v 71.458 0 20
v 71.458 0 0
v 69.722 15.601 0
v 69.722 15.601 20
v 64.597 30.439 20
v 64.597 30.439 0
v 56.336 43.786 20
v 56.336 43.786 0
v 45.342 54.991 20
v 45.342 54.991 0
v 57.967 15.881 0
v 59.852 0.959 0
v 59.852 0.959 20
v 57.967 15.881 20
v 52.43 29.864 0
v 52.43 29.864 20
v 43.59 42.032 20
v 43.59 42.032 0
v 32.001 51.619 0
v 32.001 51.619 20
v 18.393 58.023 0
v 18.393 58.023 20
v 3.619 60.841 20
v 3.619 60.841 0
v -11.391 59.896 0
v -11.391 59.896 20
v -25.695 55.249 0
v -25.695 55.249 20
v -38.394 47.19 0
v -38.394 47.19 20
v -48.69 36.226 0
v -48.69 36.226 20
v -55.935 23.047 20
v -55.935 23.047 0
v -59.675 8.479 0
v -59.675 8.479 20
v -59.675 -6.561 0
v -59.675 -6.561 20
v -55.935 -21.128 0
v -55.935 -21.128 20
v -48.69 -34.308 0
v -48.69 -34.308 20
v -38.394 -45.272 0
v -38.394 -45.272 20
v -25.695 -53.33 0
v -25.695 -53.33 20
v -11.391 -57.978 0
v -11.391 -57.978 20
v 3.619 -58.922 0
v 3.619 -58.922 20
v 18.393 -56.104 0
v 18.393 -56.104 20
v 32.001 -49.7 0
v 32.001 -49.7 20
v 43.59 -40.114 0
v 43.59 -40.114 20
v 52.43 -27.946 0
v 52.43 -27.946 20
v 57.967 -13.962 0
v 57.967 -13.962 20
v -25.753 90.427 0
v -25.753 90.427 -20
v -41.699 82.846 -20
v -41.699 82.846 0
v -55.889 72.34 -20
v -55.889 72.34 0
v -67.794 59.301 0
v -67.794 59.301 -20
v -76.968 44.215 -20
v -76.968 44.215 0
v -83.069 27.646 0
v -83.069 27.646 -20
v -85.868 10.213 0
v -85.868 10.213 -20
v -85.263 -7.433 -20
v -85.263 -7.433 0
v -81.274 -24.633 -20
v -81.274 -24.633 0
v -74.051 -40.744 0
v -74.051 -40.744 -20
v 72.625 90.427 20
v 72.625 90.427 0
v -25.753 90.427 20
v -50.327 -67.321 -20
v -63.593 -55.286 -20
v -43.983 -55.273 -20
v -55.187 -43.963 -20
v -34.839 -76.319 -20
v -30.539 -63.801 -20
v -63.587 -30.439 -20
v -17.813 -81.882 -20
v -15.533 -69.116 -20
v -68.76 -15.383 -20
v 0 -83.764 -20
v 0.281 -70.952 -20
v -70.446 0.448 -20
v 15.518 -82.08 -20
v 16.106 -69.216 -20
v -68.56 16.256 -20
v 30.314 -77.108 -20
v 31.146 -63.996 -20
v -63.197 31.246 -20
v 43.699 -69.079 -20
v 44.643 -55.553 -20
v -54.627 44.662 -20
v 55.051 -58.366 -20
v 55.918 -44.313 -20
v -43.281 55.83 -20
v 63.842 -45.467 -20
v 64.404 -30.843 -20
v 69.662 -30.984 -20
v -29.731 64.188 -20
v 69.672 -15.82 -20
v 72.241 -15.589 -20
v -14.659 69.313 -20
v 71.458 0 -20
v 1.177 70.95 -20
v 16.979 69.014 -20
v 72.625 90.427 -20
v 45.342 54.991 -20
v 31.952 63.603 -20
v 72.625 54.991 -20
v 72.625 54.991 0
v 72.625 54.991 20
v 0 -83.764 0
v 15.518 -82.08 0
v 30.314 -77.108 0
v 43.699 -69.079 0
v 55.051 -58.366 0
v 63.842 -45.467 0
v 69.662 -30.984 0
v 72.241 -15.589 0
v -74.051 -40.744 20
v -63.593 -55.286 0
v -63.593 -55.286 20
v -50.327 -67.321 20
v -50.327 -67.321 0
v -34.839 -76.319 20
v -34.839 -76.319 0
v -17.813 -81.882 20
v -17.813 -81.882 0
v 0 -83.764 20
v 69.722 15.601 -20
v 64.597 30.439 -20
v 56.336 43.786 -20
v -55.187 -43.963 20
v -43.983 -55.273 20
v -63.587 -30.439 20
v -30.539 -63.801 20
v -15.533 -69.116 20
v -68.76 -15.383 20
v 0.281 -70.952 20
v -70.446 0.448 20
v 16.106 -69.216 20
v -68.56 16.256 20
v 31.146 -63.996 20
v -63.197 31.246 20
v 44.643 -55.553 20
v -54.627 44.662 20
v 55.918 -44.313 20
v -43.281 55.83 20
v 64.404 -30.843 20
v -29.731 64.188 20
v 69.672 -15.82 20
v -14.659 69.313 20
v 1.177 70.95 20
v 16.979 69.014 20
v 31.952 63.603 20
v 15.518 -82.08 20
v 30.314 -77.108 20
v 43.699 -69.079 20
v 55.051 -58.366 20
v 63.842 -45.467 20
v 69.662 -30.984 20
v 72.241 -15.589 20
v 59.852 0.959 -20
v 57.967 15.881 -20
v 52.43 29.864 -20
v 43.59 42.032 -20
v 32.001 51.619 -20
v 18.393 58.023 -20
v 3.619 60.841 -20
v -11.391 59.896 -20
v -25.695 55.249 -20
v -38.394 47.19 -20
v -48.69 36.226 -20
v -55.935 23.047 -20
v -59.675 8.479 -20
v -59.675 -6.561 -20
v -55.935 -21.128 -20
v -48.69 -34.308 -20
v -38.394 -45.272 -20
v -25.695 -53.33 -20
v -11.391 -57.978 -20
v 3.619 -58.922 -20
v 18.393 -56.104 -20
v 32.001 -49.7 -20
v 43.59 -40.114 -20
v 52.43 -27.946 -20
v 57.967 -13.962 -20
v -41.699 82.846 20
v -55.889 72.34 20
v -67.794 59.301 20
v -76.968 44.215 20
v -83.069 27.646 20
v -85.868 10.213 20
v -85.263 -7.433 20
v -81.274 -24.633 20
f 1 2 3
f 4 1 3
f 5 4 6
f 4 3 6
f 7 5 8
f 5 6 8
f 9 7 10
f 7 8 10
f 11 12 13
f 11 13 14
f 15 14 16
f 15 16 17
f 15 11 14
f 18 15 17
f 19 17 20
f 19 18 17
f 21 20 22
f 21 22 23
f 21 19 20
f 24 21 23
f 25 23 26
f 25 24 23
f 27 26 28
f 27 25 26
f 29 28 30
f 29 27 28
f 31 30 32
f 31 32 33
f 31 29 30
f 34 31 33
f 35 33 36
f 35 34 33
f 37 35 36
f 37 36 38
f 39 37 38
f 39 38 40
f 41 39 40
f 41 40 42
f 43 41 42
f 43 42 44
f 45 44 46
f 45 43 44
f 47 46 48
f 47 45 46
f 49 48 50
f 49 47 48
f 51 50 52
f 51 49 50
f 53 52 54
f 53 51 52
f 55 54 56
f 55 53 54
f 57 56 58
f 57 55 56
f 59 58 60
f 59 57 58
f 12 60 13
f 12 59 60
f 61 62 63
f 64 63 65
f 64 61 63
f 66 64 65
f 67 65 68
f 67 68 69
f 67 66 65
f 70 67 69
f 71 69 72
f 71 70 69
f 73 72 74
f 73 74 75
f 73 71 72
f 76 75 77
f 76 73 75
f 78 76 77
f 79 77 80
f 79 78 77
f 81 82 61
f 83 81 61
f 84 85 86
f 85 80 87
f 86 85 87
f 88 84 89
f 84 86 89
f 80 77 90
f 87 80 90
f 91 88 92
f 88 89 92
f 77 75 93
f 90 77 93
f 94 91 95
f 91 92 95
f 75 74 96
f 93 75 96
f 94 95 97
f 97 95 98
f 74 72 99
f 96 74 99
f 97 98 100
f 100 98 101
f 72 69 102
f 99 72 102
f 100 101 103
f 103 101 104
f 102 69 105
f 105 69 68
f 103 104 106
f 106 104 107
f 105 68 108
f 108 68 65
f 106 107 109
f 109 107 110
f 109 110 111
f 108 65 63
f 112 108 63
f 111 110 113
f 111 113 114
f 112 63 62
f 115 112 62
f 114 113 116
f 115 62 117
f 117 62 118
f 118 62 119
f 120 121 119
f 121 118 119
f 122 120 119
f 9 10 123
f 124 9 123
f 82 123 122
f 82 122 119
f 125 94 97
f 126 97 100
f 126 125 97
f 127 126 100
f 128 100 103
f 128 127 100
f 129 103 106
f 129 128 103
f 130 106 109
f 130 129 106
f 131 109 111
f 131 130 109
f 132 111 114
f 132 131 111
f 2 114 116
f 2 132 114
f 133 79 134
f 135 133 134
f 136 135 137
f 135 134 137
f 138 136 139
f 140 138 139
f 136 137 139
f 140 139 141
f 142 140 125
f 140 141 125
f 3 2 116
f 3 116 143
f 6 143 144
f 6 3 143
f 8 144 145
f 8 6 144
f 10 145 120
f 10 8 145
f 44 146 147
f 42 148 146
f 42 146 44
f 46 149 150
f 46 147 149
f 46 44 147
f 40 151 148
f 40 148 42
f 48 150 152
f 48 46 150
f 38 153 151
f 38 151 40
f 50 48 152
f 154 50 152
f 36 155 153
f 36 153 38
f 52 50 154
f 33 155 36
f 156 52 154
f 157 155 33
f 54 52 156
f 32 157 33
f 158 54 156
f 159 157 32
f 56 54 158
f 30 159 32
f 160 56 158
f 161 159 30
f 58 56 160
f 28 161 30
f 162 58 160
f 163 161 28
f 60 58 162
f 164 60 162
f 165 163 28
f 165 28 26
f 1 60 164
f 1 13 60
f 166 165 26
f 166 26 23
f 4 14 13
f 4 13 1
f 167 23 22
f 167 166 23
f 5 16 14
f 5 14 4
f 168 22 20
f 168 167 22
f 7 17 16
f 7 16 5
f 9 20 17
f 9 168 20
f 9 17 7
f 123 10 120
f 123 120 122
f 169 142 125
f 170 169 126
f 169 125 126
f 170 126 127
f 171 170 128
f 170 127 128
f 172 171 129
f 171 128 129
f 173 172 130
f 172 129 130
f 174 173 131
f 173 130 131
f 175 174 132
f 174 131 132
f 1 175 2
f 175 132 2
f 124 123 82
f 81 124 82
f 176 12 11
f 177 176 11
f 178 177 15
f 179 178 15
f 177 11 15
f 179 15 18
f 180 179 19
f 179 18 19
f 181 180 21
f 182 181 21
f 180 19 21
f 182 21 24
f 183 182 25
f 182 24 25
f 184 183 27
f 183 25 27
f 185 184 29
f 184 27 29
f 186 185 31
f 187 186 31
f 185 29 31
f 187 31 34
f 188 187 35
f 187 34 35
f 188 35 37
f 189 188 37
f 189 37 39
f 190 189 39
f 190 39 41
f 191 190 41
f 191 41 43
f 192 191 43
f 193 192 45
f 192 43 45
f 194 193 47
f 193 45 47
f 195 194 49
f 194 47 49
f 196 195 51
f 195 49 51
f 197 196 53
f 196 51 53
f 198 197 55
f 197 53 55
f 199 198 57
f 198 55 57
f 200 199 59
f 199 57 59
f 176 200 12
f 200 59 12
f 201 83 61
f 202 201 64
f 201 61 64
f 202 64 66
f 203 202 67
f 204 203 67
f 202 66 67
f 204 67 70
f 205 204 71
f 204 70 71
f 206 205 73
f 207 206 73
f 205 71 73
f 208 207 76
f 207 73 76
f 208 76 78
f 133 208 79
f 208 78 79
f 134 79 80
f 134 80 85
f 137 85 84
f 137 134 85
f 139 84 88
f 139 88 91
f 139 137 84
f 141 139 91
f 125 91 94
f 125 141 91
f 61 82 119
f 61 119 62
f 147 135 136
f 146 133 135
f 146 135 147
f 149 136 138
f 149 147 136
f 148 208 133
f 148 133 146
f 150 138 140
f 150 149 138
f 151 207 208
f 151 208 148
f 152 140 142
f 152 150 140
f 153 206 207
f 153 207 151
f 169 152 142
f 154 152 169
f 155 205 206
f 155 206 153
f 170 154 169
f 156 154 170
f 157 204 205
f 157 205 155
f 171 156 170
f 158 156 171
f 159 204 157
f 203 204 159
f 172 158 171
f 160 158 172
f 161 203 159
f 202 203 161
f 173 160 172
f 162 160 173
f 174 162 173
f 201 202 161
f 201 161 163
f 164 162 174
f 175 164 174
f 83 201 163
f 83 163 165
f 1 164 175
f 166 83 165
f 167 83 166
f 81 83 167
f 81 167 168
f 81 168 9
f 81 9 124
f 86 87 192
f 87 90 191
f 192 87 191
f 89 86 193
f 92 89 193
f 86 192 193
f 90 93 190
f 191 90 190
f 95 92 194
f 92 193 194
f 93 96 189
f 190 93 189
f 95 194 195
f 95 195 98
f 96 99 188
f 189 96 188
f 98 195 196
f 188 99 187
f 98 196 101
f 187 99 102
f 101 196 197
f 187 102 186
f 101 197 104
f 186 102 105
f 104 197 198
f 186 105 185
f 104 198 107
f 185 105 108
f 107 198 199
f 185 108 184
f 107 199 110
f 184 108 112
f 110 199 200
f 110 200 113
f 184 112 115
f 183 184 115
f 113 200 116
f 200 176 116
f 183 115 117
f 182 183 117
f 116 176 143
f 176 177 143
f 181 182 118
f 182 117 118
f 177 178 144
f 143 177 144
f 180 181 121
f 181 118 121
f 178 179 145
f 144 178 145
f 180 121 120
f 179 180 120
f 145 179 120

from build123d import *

# Parameters (mm, degrees)
SKETCH1_R           = 70.952762223
SKETCH1_R_2         = 60
BOSS_EXTRUDE1_DEPTH = 20


with BuildPart() as part:
    # Sketch1 → Boss-Extrude1 (new, symmetric)
    # profile 1 of 2: a face of its own
    with BuildSketch(Plane.XY):
        with BuildLine():
            Line((40.505236387, 90.426645724), (-25.752991774, 90.426645724))
            ThreePointArc((-25.752991774, 90.426645724), (-80.41932051, 36.078066751), (-74.051220561, -40.74395377))
            ThreePointArc((-74.051220561, -40.74395377), (-42.820207747, -72.228243513), (0, -83.763687608))
            ThreePointArc((0, -83.763687608), (55.05134178, -58.365548869), (71.457998611, 0))
            ThreePointArc((71.457998611, 0), (-63.58670667, -30.438746727), (45.341543852, 54.990908339))
            Line((45.341543852, 54.990908339), (72.624781189, 54.990908339))
            Line((72.624781189, 54.990908339), (72.624781189, 90.426645724))
            Line((72.624781189, 90.426645724), (40.505236387, 90.426645724))
        make_face()
    # profile 2 of 2: a face of its own
    with BuildSketch(Plane.XY):
        with Locations((0.505236387, 0)):
            Circle(SKETCH1_R)
        with Locations((-0.148485531, 0.959241536)):
            Circle(SKETCH1_R_2, mode=Mode.SUBTRACT)
    extrude(amount=BOSS_EXTRUDE1_DEPTH, both=True)


solid = part.part
